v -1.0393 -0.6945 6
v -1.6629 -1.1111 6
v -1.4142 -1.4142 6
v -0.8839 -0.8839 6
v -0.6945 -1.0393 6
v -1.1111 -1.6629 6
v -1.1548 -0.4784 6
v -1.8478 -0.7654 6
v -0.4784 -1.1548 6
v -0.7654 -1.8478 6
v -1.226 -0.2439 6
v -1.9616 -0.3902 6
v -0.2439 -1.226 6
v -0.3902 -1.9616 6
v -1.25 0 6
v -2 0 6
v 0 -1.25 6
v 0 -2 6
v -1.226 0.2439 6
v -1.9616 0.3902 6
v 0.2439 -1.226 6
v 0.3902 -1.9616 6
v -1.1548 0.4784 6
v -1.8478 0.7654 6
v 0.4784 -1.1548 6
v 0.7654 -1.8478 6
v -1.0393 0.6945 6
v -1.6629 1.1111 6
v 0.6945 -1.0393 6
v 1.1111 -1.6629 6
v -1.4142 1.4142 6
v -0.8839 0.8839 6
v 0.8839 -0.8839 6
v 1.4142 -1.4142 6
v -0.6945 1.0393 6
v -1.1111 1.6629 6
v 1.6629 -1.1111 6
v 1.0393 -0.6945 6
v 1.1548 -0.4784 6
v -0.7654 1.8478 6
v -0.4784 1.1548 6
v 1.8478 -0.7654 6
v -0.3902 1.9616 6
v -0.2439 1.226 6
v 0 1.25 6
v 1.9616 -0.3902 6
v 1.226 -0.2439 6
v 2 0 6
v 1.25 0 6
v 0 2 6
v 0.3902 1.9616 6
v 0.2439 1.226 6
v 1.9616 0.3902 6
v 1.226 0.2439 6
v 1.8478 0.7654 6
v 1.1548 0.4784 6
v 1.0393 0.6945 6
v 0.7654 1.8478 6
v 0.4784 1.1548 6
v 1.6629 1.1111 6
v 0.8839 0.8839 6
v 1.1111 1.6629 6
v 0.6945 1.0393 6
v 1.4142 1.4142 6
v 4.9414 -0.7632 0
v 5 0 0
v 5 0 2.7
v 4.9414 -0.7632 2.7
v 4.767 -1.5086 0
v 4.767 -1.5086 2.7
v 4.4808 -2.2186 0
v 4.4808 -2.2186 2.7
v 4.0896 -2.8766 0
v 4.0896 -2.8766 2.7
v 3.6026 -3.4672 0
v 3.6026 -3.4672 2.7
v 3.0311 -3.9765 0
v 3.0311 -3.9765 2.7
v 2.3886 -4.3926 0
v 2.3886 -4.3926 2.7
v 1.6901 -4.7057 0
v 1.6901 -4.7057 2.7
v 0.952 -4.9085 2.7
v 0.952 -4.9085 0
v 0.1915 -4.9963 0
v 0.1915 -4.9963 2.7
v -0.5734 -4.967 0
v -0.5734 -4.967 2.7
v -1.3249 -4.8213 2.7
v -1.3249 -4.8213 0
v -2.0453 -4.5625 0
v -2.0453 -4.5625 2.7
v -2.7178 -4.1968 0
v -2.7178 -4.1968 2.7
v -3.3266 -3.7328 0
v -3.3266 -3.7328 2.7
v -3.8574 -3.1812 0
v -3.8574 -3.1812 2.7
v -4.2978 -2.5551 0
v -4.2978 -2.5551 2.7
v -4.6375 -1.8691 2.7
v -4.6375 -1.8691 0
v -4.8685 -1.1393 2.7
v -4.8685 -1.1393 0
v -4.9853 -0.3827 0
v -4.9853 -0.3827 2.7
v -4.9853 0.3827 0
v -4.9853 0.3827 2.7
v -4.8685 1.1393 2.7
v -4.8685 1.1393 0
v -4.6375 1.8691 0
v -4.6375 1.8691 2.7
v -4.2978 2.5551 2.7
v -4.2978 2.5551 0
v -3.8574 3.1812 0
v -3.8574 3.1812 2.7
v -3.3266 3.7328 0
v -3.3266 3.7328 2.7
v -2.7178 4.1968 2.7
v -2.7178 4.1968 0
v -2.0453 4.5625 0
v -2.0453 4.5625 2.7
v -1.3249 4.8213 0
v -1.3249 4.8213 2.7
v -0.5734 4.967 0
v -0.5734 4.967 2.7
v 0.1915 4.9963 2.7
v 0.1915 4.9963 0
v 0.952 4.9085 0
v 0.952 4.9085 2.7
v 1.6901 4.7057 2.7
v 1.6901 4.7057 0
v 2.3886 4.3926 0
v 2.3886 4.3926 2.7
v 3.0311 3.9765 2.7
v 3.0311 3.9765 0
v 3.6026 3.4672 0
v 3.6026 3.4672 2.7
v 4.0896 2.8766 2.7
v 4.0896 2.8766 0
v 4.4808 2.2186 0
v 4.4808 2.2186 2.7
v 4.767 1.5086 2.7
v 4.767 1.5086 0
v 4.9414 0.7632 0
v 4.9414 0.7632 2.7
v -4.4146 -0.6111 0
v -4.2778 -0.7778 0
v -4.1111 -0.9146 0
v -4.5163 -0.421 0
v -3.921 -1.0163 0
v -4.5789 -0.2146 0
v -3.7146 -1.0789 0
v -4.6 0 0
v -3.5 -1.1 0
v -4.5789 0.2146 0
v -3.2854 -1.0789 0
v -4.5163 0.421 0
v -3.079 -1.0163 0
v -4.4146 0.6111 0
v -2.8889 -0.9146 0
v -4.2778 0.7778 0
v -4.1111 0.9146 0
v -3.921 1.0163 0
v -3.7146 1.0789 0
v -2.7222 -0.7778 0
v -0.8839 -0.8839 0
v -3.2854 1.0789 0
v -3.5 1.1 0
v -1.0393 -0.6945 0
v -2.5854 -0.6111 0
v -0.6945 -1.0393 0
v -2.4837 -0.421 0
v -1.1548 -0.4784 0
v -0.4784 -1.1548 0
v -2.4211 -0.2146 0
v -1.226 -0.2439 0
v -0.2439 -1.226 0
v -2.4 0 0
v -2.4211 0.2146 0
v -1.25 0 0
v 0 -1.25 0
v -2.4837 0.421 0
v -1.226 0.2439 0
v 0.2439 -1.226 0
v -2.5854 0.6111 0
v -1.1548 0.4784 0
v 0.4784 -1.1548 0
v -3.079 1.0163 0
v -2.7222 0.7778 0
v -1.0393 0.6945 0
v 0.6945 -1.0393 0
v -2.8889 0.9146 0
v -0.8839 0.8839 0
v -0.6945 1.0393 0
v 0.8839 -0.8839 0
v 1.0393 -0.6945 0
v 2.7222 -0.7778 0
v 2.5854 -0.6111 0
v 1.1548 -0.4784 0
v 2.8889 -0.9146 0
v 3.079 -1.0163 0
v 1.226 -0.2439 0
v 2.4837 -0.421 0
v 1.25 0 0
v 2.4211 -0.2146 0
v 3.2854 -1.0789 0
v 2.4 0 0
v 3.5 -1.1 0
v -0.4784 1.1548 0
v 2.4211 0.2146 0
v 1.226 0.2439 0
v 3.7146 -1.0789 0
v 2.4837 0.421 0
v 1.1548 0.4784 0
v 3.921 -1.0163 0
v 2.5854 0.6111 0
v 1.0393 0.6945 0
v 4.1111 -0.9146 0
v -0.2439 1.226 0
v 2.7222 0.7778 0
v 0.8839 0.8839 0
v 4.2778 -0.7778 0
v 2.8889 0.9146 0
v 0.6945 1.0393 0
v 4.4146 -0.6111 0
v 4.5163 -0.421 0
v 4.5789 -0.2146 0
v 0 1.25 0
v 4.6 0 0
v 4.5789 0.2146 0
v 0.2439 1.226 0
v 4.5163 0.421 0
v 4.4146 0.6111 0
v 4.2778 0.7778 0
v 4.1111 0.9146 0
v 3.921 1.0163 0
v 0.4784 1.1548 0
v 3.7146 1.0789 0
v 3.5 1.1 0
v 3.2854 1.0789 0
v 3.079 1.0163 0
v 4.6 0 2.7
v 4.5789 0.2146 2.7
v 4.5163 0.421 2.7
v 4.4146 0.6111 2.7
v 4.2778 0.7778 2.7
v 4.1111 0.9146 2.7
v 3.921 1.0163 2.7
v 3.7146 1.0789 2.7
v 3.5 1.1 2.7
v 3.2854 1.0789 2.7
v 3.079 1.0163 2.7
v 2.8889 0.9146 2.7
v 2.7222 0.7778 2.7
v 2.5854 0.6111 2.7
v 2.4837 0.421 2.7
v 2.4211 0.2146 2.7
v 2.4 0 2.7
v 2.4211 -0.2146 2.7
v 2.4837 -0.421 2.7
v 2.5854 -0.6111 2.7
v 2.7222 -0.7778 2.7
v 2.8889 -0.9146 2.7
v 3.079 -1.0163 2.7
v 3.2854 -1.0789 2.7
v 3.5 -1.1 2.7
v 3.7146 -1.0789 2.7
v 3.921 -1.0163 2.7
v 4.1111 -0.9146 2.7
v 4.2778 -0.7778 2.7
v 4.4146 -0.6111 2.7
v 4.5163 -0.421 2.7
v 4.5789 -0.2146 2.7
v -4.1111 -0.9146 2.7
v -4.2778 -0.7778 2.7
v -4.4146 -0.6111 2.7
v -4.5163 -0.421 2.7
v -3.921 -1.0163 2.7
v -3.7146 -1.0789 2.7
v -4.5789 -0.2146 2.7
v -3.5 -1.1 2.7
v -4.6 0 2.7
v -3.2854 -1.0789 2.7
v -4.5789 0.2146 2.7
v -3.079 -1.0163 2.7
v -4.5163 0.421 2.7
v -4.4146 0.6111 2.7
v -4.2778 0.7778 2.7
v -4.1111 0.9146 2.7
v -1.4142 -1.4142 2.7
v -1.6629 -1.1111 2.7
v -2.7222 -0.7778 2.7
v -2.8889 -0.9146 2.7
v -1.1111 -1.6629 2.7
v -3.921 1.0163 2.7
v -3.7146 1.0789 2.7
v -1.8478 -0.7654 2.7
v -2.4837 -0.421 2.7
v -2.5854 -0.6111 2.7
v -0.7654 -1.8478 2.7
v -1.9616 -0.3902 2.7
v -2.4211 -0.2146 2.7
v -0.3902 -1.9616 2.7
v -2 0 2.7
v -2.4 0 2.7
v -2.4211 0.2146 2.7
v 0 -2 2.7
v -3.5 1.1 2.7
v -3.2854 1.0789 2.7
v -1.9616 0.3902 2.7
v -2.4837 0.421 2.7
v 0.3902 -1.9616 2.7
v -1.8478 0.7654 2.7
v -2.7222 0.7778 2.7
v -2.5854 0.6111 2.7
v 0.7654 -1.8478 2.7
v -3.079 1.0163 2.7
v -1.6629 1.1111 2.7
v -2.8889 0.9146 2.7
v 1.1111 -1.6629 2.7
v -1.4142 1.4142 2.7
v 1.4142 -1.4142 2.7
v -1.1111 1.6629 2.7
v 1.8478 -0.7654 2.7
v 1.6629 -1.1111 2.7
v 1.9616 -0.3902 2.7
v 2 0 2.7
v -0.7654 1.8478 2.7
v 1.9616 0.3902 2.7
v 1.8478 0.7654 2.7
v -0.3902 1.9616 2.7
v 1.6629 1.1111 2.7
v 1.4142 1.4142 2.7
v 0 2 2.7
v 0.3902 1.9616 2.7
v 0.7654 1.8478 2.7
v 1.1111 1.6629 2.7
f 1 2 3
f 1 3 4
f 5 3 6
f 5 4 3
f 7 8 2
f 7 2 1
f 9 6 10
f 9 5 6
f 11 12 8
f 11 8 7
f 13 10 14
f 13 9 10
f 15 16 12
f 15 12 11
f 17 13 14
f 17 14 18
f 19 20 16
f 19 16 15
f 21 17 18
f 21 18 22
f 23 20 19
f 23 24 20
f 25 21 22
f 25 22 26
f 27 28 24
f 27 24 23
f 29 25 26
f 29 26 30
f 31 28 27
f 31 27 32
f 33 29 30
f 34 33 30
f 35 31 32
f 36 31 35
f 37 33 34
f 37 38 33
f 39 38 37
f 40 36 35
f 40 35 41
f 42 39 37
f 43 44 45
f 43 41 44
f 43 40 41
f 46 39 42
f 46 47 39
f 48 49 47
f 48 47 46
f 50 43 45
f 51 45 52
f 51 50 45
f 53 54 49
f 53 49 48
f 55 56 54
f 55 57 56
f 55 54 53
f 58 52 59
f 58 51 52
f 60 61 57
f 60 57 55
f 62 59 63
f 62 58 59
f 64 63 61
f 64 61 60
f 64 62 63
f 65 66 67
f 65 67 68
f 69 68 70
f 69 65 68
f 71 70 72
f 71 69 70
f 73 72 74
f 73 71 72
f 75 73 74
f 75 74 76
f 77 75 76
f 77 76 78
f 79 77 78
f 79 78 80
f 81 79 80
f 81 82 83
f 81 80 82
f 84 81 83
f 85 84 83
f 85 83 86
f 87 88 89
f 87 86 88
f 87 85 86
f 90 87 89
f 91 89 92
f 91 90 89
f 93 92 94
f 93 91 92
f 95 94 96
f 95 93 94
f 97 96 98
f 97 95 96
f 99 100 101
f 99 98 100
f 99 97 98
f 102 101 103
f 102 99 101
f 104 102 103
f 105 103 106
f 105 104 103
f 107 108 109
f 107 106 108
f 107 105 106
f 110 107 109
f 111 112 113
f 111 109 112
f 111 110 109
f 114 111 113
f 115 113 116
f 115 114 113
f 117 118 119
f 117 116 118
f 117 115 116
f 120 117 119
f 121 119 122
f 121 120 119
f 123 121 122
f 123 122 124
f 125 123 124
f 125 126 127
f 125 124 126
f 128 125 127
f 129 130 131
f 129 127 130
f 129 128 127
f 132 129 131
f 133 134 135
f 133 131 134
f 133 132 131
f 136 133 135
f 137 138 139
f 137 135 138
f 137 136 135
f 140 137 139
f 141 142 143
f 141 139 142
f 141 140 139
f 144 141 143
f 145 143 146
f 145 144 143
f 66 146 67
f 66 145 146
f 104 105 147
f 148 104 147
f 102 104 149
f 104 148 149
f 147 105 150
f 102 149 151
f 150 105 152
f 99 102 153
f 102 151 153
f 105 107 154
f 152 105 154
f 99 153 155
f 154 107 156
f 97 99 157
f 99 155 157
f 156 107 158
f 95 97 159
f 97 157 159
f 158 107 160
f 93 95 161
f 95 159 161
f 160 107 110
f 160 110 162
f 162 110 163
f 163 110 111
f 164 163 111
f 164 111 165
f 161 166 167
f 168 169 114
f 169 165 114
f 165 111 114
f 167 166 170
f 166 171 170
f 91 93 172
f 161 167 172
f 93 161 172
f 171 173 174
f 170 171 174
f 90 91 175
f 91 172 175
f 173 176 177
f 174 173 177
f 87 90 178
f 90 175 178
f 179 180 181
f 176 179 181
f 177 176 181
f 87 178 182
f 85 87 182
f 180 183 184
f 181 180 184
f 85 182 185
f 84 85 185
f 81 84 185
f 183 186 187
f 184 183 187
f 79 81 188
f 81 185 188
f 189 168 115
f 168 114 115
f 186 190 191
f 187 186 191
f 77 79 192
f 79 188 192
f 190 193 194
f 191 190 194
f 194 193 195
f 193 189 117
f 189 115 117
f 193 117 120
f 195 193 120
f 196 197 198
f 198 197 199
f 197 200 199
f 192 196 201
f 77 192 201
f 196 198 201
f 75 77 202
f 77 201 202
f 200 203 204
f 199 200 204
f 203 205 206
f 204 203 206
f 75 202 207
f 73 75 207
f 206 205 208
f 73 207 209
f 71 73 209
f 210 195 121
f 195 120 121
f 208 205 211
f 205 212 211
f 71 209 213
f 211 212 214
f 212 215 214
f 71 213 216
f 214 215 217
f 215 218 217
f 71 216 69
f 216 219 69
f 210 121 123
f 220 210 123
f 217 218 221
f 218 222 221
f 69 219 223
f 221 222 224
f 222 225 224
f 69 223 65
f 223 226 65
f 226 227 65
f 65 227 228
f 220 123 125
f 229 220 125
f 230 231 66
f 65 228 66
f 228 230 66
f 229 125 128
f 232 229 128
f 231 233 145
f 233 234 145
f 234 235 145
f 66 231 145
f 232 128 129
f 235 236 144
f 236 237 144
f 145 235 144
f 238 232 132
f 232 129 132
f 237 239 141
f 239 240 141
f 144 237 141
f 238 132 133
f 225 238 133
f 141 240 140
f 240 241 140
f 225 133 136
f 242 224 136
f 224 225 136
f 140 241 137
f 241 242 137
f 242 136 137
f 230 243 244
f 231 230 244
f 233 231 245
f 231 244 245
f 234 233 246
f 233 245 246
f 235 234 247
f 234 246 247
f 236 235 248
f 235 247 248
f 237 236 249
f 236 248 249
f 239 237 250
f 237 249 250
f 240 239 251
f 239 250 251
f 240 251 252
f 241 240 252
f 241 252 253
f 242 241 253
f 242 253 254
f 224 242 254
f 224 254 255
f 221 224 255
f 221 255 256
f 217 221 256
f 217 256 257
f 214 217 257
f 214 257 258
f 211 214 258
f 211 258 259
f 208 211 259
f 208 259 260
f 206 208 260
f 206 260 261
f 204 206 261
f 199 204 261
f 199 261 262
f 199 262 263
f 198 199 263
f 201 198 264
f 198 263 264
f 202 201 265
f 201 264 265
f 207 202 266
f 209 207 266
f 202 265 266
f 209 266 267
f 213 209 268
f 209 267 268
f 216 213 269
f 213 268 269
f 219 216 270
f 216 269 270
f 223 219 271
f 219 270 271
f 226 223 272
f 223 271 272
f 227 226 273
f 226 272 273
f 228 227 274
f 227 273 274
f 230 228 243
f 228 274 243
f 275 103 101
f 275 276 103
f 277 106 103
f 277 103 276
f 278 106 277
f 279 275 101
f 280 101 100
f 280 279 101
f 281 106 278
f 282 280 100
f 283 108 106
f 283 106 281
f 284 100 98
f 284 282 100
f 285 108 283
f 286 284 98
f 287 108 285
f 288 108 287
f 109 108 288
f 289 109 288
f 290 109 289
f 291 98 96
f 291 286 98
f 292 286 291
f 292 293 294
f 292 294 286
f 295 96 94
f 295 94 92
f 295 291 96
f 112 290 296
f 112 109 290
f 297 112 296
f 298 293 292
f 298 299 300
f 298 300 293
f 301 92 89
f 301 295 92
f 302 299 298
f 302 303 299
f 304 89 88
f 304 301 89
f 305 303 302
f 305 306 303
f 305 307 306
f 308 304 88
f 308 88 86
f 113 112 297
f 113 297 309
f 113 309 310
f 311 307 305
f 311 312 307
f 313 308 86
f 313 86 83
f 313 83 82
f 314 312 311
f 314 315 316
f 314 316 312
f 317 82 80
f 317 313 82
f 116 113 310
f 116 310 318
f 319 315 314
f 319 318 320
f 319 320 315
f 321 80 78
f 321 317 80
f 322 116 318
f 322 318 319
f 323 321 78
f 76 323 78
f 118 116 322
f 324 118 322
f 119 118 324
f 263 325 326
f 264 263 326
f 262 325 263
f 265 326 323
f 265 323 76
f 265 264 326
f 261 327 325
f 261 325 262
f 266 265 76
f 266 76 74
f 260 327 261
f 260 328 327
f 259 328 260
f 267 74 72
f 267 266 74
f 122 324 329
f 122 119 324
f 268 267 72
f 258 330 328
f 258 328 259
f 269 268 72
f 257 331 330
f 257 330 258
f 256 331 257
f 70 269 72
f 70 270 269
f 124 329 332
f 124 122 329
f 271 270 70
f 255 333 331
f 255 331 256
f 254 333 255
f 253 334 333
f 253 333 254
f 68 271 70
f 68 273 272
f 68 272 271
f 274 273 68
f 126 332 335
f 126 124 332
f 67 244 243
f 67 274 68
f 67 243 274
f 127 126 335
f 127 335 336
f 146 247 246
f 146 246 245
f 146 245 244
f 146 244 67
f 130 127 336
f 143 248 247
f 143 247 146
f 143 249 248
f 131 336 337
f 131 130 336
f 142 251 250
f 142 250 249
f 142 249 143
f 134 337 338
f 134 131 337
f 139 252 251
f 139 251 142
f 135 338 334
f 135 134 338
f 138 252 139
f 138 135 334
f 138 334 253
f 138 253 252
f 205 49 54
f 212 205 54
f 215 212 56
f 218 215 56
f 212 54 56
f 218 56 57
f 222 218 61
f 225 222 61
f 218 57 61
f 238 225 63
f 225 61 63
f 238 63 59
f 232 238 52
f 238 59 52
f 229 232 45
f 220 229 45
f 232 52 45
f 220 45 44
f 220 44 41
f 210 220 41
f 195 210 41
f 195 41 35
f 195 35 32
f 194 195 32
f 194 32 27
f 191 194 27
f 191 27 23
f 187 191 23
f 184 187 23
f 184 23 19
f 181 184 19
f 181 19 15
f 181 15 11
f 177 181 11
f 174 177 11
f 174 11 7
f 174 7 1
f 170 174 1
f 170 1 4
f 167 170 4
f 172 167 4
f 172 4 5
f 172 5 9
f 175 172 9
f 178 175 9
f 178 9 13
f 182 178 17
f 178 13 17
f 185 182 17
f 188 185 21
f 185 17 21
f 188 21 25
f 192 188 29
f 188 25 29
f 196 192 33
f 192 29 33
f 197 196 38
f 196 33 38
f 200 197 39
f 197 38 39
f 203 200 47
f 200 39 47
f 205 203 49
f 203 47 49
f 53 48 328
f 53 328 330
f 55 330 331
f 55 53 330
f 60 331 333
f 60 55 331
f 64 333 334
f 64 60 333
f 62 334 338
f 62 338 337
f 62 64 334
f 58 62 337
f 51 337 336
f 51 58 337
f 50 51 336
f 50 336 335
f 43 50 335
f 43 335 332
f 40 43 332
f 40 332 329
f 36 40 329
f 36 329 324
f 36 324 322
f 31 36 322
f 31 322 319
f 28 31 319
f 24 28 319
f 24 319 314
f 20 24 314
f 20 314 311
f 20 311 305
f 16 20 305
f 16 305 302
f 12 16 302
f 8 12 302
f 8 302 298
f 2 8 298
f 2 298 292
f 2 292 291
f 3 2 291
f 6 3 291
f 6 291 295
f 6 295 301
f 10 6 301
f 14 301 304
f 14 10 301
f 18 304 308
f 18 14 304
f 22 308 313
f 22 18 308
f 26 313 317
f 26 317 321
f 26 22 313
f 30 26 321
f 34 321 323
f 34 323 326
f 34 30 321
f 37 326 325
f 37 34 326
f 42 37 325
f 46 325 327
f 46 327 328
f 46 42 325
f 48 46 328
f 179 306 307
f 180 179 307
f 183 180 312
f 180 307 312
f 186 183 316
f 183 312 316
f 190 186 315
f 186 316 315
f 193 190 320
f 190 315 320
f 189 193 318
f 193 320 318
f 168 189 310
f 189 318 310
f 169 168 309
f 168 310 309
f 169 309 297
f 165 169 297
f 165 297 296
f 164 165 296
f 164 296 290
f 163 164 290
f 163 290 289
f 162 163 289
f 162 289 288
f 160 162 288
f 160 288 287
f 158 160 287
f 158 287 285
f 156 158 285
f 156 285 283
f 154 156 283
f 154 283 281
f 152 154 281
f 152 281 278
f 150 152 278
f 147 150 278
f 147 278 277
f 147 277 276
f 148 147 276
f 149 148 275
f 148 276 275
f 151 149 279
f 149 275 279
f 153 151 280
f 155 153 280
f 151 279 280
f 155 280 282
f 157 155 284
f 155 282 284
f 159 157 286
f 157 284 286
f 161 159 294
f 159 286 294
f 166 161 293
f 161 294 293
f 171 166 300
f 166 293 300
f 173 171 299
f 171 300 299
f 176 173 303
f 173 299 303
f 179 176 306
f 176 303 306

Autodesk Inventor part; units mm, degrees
ref_plane "YZ Plane" through (0, 0, 0) normal (1, 0, 0) x (0, 1, 0)
ref_plane "XZ Plane" through (0, 0, 0) normal (0, 1, 0) x (-1, 0, 0)
ref_plane "XY Plane" through (0, 0, 0) normal (0, 0, 1) x (1, 0, 0)
sketch "スケッチ1" plane through (0, 0, 0) normal (0, 0, 1) x (1, 0, 0)
  circle A0 centre (0, 0) radius 5
  dimension "d0" = 10
extrude "押し出し1" add sketch "スケッチ1" along normal blind 6
sketch "スケッチ2" plane through (0, 0, 6) normal (0, 0, 1) x (1, 0, 0)
  circle A0 centre (0, 0) radius 5
  circle A1 centre (0, 0) radius 2
  dimension "d3" = 4
extrude "押し出し2" cut sketch "スケッチ2" against normal blind 3.3
sketch "スケッチ3" plane through (0, 0, 6) normal (0, 0, 1) x (1, 0, 0)
  circle A0 centre (0, 0) radius 1.25
  dimension "d6" = 2.5
extrude "押し出し3" cut sketch "スケッチ3" against normal blind 6
sketch "スケッチ4" plane through (0, 0, 2.7) normal (0, 0, 1) x (1, 0, 0)
  circle A0 centre (0, 0) radius 3.5
  circle A1 centre (-3.5, 0) radius 1.1
  circle A2 centre (3.5, 0) radius 1.1
  dimension "d9" = 7
  dimension "d10" = 2.2
  dimension "d11" = 2.2
extrude "押し出し4" cut sketch "スケッチ4" against normal blind 6 contours A0 A2 | A0 A2 | A1 A0 | A0 A1
properties part number "homemade_setcolor-2_jig"
